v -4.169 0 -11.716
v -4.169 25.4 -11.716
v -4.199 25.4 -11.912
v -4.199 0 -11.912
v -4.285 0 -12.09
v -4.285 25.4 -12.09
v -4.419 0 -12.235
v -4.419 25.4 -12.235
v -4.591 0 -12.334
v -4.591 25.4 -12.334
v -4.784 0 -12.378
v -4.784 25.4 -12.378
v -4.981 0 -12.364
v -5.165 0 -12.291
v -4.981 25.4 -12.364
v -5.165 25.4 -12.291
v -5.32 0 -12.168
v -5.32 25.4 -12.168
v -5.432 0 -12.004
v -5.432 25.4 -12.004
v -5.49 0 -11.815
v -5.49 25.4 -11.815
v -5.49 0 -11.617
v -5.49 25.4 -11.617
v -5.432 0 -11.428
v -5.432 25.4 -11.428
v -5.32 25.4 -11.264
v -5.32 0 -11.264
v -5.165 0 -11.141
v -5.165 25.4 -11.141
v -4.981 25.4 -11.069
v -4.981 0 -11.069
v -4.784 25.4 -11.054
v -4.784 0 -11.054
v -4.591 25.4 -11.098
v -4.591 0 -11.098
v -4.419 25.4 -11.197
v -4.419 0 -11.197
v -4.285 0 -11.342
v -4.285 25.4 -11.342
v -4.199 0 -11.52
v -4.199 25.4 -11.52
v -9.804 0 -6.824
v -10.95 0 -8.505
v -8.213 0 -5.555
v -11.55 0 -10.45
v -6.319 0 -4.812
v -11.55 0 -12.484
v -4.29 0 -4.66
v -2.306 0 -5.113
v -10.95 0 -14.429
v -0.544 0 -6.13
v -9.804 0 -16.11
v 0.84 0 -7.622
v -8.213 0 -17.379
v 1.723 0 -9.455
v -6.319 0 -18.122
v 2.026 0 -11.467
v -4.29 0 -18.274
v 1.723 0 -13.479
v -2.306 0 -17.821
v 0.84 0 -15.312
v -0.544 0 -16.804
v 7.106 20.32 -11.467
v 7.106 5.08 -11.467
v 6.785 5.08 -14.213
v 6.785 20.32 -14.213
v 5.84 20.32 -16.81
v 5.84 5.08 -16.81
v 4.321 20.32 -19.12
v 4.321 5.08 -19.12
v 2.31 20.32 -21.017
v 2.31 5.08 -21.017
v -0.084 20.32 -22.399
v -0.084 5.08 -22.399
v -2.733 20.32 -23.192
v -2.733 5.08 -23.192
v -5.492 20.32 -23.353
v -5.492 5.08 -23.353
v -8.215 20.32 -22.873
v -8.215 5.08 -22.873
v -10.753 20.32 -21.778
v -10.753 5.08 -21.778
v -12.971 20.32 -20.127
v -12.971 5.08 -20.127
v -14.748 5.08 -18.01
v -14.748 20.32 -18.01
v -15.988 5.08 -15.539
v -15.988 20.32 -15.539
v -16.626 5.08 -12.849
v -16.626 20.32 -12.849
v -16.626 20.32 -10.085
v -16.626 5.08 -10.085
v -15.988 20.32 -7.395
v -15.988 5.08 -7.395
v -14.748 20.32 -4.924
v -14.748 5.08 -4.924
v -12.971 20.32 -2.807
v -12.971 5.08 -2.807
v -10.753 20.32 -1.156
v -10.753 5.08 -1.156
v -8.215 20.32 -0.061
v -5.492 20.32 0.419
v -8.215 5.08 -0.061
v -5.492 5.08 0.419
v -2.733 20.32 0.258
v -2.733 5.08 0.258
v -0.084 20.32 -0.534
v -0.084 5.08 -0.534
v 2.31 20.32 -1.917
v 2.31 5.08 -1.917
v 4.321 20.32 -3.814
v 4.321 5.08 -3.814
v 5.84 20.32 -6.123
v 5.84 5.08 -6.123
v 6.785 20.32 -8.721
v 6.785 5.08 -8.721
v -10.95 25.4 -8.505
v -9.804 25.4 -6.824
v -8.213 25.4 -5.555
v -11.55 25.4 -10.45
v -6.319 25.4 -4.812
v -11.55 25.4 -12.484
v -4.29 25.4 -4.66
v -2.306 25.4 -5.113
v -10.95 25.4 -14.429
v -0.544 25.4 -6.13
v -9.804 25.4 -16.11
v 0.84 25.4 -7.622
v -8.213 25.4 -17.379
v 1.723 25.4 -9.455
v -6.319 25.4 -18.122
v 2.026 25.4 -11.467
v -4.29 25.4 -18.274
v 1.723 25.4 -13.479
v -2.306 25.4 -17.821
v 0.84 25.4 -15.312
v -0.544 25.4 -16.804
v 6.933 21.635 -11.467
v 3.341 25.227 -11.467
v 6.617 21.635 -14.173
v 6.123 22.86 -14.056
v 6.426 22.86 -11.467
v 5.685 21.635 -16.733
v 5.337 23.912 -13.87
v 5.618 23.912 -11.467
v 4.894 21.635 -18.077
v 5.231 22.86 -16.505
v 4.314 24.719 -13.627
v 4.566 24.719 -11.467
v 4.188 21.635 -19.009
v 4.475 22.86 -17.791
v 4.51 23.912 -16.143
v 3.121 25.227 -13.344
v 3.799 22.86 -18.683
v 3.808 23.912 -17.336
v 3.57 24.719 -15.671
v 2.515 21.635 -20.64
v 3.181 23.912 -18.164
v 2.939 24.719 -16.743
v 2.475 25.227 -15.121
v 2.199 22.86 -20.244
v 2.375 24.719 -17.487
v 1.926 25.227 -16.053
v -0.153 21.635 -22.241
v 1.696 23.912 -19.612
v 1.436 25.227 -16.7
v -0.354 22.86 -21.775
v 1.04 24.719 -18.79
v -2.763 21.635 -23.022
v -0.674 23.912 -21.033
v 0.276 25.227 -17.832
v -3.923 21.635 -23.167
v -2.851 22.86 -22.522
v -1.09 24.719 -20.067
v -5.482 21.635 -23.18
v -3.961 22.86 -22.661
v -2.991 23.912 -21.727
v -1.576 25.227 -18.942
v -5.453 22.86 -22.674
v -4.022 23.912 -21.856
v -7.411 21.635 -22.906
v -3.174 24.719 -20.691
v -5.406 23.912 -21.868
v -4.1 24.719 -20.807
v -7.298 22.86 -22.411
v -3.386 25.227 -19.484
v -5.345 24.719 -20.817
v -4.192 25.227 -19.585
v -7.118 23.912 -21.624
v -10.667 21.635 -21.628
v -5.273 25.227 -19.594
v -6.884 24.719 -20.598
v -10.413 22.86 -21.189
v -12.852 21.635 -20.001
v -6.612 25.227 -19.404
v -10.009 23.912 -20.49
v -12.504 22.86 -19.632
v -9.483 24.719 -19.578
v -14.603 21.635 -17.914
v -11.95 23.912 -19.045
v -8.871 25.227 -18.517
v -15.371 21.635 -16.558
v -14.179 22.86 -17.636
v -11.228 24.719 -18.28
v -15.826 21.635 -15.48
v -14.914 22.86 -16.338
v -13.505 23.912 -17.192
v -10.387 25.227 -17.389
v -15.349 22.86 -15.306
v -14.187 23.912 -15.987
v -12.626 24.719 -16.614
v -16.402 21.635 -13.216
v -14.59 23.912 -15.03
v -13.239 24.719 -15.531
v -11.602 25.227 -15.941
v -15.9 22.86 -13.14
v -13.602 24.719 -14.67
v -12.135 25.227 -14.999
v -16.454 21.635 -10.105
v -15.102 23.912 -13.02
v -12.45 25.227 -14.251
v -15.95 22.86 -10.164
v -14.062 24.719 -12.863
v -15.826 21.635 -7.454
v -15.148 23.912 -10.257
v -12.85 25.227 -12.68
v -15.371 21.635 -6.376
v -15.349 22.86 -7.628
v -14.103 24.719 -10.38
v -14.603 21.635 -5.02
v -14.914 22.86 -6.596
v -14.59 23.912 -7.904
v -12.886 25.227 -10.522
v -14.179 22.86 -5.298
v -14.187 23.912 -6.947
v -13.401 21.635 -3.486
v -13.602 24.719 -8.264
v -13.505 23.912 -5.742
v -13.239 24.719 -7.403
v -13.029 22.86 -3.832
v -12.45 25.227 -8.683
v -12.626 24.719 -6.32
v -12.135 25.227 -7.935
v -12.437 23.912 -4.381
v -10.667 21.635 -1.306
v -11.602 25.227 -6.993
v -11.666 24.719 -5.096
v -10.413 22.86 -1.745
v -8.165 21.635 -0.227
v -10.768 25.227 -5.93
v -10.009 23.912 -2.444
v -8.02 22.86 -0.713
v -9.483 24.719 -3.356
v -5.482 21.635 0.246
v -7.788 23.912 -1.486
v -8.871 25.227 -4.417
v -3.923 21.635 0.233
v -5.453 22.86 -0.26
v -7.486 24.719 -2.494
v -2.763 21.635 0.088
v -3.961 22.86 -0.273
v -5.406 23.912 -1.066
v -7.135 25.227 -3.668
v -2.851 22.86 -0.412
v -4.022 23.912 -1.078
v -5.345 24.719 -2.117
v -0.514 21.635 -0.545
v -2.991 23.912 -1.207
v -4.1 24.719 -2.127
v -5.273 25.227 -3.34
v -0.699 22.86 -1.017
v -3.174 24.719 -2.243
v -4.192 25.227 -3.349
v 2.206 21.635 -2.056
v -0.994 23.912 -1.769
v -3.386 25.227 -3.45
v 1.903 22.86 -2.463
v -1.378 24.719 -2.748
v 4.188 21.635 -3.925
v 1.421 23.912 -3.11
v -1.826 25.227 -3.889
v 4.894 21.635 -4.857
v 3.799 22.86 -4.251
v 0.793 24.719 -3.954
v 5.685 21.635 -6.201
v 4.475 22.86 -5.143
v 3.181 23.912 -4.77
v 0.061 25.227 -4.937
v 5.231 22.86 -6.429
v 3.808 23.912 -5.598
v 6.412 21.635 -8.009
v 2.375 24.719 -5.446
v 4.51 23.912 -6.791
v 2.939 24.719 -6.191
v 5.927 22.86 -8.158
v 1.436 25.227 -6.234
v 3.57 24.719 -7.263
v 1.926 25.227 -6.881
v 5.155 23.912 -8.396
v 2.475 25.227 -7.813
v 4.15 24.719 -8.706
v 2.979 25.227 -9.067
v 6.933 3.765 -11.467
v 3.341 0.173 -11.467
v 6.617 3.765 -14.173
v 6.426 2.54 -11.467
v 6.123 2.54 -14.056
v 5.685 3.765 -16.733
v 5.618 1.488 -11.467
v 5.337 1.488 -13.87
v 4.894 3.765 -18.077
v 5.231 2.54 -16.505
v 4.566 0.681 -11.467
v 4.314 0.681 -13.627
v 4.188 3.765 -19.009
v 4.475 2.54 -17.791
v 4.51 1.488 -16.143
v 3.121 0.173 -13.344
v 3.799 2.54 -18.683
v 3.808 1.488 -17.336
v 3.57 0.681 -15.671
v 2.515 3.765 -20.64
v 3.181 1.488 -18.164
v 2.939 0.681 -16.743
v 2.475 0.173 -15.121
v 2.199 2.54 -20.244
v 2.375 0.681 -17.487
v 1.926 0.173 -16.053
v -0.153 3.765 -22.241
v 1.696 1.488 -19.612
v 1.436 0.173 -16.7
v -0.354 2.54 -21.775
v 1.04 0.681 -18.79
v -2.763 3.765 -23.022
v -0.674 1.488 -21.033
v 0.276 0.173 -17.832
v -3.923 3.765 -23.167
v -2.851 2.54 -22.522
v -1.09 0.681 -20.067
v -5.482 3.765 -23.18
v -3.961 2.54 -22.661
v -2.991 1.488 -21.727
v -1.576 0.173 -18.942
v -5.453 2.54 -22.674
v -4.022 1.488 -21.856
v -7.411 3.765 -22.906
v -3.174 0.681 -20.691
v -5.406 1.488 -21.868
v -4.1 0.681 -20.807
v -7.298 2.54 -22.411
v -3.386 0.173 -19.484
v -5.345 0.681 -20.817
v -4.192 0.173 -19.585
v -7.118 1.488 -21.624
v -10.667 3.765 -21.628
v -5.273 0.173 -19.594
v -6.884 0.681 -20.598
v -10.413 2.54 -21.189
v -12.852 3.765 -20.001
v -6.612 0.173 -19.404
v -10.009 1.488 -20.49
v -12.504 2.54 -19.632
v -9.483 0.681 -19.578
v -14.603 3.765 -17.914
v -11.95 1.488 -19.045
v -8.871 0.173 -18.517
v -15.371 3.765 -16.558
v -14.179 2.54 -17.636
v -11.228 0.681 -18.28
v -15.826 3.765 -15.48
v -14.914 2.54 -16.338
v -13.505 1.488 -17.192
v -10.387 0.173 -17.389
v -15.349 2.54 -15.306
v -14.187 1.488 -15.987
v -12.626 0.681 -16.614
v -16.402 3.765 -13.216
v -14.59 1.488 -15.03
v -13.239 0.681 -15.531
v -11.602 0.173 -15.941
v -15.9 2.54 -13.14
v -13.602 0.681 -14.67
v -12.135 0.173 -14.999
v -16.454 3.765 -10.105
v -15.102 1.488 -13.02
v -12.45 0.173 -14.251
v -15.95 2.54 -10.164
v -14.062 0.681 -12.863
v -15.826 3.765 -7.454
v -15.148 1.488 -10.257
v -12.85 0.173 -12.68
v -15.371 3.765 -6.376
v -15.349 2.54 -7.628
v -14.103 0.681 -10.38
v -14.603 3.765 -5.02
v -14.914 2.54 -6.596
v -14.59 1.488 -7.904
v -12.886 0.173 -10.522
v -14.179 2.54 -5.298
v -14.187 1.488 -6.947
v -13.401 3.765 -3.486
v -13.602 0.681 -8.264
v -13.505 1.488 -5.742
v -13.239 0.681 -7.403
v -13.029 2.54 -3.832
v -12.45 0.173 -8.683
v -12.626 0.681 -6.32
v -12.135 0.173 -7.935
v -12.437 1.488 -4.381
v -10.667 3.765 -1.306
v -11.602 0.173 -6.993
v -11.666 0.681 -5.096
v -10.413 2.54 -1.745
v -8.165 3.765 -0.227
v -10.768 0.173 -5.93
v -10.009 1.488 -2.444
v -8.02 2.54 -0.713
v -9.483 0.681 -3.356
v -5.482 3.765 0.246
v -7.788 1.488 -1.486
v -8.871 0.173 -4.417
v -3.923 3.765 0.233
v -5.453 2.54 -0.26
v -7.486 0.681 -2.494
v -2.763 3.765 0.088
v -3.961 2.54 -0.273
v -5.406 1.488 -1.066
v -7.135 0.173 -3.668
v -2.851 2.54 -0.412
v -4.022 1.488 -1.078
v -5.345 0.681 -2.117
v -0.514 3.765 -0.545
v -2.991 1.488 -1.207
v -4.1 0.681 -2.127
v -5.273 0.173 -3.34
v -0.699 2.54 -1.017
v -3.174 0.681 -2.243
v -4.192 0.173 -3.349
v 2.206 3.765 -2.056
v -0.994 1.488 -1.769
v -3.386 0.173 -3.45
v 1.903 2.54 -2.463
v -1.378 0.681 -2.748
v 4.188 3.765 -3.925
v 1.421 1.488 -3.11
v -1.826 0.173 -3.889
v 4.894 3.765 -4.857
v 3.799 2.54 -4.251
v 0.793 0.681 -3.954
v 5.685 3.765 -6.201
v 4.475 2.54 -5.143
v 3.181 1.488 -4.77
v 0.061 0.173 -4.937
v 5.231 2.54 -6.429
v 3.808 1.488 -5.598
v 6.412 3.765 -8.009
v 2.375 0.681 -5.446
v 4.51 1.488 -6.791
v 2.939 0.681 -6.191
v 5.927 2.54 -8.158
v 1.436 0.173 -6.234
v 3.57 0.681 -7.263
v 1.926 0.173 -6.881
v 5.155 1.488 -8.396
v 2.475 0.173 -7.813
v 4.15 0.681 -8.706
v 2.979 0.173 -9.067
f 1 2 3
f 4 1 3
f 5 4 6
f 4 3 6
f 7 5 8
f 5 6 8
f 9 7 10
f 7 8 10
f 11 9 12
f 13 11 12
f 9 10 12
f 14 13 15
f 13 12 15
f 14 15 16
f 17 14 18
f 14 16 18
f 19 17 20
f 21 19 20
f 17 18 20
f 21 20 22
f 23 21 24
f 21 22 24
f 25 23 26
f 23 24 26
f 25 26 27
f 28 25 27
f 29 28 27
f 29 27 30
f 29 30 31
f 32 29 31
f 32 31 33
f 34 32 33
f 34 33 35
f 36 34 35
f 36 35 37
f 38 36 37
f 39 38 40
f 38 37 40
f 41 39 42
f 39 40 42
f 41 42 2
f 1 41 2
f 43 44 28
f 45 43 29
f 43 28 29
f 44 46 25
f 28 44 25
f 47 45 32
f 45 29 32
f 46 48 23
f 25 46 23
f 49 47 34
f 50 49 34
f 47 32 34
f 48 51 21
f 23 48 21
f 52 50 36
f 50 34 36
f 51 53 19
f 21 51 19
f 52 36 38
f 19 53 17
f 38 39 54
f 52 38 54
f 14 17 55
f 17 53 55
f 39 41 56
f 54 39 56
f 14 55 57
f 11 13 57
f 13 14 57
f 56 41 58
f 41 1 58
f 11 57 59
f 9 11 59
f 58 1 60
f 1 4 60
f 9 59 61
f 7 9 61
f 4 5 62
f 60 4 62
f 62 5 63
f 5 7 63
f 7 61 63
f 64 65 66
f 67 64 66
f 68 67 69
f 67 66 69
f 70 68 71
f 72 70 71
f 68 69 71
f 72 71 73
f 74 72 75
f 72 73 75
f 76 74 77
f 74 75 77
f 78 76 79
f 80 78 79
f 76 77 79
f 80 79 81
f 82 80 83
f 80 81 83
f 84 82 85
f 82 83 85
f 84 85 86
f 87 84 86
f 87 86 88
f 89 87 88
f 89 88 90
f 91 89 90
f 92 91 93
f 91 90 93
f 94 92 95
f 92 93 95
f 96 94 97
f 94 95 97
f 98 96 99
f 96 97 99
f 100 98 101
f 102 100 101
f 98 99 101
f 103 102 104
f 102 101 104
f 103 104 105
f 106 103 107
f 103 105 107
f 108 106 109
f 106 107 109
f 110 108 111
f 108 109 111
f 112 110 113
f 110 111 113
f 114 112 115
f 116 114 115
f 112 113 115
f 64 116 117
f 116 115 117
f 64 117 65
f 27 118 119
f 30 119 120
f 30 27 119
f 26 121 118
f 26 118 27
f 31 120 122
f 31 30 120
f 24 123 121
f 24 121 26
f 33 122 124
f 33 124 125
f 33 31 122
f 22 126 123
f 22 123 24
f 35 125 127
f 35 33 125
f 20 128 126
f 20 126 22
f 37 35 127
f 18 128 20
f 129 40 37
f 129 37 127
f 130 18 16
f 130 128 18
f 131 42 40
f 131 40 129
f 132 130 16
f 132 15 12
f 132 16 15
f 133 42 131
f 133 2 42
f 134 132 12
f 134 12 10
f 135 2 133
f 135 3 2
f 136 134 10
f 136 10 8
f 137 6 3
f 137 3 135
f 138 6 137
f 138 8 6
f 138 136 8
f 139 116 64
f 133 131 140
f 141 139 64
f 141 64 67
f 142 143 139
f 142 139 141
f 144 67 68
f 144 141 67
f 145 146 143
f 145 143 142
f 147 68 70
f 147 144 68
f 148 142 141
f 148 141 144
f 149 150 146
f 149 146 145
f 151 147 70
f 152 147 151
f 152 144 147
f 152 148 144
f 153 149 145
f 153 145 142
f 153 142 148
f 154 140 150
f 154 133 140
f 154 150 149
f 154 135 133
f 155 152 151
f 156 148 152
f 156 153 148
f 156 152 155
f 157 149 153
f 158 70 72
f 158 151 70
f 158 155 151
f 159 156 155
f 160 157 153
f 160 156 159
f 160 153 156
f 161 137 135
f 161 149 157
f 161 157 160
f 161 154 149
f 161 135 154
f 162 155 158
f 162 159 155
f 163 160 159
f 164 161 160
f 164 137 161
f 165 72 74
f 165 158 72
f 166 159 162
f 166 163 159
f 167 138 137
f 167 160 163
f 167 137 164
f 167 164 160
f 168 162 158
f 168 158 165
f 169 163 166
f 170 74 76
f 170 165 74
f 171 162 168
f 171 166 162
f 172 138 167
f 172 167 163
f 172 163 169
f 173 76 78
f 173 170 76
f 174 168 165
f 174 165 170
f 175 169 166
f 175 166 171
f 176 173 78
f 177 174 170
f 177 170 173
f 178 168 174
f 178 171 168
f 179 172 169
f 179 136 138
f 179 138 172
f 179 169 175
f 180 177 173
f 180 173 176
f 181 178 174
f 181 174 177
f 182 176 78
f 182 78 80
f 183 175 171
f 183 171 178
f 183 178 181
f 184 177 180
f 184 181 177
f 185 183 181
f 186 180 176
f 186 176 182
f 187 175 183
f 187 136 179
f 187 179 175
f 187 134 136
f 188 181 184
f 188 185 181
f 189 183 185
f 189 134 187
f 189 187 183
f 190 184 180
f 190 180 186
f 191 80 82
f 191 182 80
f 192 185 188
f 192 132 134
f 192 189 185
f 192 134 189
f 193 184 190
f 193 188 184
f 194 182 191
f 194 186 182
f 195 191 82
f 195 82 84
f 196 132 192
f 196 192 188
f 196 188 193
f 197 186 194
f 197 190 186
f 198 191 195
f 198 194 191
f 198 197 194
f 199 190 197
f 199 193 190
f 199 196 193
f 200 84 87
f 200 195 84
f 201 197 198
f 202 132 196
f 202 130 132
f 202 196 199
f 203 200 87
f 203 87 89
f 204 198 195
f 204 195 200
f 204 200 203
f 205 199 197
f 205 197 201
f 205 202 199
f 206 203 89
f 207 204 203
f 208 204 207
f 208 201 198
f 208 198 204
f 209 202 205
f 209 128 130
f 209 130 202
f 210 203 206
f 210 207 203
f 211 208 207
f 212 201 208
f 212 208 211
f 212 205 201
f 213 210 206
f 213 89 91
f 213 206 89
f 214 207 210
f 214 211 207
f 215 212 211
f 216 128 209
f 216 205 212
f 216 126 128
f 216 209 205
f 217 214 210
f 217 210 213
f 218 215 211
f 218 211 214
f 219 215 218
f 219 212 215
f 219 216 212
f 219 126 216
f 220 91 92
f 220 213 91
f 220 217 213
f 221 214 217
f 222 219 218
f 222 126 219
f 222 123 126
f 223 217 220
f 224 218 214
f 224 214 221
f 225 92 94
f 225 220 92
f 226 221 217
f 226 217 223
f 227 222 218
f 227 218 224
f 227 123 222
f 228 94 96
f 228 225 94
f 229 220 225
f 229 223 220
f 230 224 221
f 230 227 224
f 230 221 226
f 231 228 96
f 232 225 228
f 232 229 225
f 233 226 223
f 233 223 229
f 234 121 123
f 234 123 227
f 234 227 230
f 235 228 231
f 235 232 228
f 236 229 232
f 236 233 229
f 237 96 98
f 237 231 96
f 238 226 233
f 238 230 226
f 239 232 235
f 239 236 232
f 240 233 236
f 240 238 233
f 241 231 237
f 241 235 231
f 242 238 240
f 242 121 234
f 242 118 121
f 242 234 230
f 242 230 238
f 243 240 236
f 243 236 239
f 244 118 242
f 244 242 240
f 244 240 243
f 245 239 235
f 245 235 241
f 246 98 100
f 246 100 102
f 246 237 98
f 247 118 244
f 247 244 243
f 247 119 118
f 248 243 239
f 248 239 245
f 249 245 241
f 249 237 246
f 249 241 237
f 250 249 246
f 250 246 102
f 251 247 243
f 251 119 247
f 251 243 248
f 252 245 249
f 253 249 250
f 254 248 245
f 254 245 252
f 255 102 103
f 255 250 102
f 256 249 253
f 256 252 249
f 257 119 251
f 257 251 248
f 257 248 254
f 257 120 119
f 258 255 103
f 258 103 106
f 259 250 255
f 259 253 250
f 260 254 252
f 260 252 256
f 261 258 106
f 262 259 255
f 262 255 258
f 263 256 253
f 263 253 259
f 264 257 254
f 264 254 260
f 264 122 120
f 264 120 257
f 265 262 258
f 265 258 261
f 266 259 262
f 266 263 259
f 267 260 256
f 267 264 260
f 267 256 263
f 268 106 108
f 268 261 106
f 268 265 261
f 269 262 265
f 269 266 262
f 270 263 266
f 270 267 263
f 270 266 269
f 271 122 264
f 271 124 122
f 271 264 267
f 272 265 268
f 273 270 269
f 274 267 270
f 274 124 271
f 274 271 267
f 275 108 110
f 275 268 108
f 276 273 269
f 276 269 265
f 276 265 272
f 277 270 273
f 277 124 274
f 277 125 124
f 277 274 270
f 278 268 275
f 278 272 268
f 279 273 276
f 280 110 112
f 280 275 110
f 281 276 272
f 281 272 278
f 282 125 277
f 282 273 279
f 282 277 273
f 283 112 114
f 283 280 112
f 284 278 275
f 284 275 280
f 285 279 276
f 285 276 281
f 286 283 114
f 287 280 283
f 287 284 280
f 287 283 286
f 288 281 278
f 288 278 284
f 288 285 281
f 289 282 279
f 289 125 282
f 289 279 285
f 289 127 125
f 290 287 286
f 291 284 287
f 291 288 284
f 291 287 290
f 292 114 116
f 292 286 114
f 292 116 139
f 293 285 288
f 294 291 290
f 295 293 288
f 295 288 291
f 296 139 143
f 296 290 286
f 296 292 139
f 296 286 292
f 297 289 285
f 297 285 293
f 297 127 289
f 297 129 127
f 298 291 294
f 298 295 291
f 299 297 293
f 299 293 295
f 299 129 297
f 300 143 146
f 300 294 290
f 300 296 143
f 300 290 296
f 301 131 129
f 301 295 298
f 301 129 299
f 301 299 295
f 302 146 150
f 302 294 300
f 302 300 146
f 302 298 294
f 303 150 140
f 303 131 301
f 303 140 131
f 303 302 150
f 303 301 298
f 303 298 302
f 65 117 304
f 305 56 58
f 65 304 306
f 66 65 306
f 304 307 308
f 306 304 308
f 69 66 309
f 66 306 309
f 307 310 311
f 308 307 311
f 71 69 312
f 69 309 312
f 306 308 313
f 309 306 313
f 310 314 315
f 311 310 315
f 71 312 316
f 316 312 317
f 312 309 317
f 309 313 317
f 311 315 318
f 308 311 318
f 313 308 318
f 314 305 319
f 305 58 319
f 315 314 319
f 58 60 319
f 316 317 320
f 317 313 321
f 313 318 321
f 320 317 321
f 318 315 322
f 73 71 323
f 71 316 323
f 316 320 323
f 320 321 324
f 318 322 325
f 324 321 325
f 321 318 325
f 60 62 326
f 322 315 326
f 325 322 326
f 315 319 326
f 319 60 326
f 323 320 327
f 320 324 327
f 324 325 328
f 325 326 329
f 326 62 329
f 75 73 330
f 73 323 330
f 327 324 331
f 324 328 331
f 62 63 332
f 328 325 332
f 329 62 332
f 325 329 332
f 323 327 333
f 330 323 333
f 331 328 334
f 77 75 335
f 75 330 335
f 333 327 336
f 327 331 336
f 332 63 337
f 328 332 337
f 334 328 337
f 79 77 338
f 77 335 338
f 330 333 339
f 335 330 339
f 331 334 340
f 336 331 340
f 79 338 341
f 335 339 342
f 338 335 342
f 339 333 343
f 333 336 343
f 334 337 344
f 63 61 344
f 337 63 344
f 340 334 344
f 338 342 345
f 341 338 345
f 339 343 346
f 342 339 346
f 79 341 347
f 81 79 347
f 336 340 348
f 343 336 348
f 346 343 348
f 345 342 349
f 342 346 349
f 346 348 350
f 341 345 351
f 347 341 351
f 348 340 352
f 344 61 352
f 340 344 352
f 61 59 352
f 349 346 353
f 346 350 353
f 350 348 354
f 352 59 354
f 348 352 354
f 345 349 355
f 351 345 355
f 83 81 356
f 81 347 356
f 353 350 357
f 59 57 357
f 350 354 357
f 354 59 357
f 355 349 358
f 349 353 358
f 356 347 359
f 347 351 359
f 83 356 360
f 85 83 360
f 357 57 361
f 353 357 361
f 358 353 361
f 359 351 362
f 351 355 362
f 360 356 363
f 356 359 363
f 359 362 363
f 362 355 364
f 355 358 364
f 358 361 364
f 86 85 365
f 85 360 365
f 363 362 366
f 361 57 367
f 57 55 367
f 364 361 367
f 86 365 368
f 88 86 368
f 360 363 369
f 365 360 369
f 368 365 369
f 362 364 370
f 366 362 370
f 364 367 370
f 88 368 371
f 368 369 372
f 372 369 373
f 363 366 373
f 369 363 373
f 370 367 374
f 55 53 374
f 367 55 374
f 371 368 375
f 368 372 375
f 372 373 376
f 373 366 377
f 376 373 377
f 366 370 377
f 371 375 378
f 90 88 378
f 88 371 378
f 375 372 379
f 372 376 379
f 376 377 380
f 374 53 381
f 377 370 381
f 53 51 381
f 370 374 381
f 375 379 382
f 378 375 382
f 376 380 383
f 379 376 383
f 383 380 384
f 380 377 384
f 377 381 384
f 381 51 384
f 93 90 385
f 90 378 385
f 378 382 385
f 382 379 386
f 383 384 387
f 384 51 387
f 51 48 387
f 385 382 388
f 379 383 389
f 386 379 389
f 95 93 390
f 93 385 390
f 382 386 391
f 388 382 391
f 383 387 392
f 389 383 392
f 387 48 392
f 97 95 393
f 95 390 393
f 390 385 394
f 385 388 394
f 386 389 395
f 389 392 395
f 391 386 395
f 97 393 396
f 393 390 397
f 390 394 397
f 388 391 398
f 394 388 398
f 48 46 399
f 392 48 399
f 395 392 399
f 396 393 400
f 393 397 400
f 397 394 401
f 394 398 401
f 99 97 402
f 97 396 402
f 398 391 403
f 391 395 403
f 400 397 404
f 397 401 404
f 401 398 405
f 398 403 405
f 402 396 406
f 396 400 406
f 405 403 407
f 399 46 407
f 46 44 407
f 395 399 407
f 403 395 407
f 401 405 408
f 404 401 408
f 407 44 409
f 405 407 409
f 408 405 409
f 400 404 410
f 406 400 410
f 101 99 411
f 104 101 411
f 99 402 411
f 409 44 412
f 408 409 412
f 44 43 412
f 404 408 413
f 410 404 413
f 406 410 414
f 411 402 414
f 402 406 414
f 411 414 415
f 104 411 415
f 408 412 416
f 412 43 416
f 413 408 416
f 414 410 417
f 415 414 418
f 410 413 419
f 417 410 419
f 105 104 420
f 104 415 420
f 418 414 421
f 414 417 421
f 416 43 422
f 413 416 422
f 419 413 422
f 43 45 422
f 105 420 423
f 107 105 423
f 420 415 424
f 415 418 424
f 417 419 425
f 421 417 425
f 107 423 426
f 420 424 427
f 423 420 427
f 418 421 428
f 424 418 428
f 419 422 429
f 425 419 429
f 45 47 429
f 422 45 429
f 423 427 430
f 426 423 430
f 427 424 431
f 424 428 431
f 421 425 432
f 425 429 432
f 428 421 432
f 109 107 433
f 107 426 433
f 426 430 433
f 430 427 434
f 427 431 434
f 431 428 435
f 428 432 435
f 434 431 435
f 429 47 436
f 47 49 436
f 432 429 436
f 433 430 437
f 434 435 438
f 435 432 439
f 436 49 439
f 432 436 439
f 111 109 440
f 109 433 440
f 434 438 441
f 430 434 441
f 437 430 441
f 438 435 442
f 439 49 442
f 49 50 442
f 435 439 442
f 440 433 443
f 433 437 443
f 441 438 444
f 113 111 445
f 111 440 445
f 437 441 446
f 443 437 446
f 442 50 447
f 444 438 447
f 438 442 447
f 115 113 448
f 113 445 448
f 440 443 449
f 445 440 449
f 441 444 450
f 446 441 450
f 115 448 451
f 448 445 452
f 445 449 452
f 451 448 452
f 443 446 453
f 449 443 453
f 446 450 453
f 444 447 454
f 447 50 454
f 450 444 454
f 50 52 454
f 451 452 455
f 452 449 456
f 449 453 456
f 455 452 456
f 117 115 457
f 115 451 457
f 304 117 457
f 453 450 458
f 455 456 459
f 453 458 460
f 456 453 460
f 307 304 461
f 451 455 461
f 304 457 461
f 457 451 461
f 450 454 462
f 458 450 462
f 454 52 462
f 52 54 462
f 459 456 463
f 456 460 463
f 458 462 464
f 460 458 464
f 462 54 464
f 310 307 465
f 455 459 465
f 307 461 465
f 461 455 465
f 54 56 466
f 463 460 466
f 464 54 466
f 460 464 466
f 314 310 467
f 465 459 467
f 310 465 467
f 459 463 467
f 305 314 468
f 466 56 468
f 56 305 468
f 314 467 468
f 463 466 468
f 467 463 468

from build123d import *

# Parameters (mm, degrees)
SKETCH1_R           = 11.90625
BOSS_EXTRUDE1_DEPTH = 25.4
FILLET3_R           = 5.08
FILLET4_R           = 5.08
SKETCH2_R           = 0.664162981
CUT_EXTRUDE1_DEPTH  = 25.4


with BuildPart() as part:
    # Sketch1 → Boss-Extrude1 (new body)
    with BuildSketch(Plane(origin=(0, 0, 0), x_dir=(1, 0, 0), z_dir=(0, 1, 0))):
        with Locations((-4.800132003, 11.466982006)):
            Circle(SKETCH1_R)
    extrude(amount=BOSS_EXTRUDE1_DEPTH)

    # Fillet3
    fillet3_edges = [part.edges().sort_by_distance(p)[0] for p in [
        (-16.706382003, 25.4, -11.466982006),
    ]]
    fillet(fillet3_edges, radius=FILLET3_R)

    # Fillet4
    fillet4_edges = [part.edges().sort_by_distance(p)[0] for p in [
        (-16.706382003, 0, -11.466982006),
    ]]
    fillet(fillet4_edges, radius=FILLET4_R)

    # Sketch2 → Cut-Extrude1 (cut)
    with BuildSketch(Plane(origin=(0, 25.4, 0), x_dir=(1, 0, 0), z_dir=(0, 1, 0))):
        with Locations((-4.833340152, 11.716043124)):
            Circle(SKETCH2_R)
    extrude(amount=-CUT_EXTRUDE1_DEPTH, mode=Mode.SUBTRACT)


solid = part.part
